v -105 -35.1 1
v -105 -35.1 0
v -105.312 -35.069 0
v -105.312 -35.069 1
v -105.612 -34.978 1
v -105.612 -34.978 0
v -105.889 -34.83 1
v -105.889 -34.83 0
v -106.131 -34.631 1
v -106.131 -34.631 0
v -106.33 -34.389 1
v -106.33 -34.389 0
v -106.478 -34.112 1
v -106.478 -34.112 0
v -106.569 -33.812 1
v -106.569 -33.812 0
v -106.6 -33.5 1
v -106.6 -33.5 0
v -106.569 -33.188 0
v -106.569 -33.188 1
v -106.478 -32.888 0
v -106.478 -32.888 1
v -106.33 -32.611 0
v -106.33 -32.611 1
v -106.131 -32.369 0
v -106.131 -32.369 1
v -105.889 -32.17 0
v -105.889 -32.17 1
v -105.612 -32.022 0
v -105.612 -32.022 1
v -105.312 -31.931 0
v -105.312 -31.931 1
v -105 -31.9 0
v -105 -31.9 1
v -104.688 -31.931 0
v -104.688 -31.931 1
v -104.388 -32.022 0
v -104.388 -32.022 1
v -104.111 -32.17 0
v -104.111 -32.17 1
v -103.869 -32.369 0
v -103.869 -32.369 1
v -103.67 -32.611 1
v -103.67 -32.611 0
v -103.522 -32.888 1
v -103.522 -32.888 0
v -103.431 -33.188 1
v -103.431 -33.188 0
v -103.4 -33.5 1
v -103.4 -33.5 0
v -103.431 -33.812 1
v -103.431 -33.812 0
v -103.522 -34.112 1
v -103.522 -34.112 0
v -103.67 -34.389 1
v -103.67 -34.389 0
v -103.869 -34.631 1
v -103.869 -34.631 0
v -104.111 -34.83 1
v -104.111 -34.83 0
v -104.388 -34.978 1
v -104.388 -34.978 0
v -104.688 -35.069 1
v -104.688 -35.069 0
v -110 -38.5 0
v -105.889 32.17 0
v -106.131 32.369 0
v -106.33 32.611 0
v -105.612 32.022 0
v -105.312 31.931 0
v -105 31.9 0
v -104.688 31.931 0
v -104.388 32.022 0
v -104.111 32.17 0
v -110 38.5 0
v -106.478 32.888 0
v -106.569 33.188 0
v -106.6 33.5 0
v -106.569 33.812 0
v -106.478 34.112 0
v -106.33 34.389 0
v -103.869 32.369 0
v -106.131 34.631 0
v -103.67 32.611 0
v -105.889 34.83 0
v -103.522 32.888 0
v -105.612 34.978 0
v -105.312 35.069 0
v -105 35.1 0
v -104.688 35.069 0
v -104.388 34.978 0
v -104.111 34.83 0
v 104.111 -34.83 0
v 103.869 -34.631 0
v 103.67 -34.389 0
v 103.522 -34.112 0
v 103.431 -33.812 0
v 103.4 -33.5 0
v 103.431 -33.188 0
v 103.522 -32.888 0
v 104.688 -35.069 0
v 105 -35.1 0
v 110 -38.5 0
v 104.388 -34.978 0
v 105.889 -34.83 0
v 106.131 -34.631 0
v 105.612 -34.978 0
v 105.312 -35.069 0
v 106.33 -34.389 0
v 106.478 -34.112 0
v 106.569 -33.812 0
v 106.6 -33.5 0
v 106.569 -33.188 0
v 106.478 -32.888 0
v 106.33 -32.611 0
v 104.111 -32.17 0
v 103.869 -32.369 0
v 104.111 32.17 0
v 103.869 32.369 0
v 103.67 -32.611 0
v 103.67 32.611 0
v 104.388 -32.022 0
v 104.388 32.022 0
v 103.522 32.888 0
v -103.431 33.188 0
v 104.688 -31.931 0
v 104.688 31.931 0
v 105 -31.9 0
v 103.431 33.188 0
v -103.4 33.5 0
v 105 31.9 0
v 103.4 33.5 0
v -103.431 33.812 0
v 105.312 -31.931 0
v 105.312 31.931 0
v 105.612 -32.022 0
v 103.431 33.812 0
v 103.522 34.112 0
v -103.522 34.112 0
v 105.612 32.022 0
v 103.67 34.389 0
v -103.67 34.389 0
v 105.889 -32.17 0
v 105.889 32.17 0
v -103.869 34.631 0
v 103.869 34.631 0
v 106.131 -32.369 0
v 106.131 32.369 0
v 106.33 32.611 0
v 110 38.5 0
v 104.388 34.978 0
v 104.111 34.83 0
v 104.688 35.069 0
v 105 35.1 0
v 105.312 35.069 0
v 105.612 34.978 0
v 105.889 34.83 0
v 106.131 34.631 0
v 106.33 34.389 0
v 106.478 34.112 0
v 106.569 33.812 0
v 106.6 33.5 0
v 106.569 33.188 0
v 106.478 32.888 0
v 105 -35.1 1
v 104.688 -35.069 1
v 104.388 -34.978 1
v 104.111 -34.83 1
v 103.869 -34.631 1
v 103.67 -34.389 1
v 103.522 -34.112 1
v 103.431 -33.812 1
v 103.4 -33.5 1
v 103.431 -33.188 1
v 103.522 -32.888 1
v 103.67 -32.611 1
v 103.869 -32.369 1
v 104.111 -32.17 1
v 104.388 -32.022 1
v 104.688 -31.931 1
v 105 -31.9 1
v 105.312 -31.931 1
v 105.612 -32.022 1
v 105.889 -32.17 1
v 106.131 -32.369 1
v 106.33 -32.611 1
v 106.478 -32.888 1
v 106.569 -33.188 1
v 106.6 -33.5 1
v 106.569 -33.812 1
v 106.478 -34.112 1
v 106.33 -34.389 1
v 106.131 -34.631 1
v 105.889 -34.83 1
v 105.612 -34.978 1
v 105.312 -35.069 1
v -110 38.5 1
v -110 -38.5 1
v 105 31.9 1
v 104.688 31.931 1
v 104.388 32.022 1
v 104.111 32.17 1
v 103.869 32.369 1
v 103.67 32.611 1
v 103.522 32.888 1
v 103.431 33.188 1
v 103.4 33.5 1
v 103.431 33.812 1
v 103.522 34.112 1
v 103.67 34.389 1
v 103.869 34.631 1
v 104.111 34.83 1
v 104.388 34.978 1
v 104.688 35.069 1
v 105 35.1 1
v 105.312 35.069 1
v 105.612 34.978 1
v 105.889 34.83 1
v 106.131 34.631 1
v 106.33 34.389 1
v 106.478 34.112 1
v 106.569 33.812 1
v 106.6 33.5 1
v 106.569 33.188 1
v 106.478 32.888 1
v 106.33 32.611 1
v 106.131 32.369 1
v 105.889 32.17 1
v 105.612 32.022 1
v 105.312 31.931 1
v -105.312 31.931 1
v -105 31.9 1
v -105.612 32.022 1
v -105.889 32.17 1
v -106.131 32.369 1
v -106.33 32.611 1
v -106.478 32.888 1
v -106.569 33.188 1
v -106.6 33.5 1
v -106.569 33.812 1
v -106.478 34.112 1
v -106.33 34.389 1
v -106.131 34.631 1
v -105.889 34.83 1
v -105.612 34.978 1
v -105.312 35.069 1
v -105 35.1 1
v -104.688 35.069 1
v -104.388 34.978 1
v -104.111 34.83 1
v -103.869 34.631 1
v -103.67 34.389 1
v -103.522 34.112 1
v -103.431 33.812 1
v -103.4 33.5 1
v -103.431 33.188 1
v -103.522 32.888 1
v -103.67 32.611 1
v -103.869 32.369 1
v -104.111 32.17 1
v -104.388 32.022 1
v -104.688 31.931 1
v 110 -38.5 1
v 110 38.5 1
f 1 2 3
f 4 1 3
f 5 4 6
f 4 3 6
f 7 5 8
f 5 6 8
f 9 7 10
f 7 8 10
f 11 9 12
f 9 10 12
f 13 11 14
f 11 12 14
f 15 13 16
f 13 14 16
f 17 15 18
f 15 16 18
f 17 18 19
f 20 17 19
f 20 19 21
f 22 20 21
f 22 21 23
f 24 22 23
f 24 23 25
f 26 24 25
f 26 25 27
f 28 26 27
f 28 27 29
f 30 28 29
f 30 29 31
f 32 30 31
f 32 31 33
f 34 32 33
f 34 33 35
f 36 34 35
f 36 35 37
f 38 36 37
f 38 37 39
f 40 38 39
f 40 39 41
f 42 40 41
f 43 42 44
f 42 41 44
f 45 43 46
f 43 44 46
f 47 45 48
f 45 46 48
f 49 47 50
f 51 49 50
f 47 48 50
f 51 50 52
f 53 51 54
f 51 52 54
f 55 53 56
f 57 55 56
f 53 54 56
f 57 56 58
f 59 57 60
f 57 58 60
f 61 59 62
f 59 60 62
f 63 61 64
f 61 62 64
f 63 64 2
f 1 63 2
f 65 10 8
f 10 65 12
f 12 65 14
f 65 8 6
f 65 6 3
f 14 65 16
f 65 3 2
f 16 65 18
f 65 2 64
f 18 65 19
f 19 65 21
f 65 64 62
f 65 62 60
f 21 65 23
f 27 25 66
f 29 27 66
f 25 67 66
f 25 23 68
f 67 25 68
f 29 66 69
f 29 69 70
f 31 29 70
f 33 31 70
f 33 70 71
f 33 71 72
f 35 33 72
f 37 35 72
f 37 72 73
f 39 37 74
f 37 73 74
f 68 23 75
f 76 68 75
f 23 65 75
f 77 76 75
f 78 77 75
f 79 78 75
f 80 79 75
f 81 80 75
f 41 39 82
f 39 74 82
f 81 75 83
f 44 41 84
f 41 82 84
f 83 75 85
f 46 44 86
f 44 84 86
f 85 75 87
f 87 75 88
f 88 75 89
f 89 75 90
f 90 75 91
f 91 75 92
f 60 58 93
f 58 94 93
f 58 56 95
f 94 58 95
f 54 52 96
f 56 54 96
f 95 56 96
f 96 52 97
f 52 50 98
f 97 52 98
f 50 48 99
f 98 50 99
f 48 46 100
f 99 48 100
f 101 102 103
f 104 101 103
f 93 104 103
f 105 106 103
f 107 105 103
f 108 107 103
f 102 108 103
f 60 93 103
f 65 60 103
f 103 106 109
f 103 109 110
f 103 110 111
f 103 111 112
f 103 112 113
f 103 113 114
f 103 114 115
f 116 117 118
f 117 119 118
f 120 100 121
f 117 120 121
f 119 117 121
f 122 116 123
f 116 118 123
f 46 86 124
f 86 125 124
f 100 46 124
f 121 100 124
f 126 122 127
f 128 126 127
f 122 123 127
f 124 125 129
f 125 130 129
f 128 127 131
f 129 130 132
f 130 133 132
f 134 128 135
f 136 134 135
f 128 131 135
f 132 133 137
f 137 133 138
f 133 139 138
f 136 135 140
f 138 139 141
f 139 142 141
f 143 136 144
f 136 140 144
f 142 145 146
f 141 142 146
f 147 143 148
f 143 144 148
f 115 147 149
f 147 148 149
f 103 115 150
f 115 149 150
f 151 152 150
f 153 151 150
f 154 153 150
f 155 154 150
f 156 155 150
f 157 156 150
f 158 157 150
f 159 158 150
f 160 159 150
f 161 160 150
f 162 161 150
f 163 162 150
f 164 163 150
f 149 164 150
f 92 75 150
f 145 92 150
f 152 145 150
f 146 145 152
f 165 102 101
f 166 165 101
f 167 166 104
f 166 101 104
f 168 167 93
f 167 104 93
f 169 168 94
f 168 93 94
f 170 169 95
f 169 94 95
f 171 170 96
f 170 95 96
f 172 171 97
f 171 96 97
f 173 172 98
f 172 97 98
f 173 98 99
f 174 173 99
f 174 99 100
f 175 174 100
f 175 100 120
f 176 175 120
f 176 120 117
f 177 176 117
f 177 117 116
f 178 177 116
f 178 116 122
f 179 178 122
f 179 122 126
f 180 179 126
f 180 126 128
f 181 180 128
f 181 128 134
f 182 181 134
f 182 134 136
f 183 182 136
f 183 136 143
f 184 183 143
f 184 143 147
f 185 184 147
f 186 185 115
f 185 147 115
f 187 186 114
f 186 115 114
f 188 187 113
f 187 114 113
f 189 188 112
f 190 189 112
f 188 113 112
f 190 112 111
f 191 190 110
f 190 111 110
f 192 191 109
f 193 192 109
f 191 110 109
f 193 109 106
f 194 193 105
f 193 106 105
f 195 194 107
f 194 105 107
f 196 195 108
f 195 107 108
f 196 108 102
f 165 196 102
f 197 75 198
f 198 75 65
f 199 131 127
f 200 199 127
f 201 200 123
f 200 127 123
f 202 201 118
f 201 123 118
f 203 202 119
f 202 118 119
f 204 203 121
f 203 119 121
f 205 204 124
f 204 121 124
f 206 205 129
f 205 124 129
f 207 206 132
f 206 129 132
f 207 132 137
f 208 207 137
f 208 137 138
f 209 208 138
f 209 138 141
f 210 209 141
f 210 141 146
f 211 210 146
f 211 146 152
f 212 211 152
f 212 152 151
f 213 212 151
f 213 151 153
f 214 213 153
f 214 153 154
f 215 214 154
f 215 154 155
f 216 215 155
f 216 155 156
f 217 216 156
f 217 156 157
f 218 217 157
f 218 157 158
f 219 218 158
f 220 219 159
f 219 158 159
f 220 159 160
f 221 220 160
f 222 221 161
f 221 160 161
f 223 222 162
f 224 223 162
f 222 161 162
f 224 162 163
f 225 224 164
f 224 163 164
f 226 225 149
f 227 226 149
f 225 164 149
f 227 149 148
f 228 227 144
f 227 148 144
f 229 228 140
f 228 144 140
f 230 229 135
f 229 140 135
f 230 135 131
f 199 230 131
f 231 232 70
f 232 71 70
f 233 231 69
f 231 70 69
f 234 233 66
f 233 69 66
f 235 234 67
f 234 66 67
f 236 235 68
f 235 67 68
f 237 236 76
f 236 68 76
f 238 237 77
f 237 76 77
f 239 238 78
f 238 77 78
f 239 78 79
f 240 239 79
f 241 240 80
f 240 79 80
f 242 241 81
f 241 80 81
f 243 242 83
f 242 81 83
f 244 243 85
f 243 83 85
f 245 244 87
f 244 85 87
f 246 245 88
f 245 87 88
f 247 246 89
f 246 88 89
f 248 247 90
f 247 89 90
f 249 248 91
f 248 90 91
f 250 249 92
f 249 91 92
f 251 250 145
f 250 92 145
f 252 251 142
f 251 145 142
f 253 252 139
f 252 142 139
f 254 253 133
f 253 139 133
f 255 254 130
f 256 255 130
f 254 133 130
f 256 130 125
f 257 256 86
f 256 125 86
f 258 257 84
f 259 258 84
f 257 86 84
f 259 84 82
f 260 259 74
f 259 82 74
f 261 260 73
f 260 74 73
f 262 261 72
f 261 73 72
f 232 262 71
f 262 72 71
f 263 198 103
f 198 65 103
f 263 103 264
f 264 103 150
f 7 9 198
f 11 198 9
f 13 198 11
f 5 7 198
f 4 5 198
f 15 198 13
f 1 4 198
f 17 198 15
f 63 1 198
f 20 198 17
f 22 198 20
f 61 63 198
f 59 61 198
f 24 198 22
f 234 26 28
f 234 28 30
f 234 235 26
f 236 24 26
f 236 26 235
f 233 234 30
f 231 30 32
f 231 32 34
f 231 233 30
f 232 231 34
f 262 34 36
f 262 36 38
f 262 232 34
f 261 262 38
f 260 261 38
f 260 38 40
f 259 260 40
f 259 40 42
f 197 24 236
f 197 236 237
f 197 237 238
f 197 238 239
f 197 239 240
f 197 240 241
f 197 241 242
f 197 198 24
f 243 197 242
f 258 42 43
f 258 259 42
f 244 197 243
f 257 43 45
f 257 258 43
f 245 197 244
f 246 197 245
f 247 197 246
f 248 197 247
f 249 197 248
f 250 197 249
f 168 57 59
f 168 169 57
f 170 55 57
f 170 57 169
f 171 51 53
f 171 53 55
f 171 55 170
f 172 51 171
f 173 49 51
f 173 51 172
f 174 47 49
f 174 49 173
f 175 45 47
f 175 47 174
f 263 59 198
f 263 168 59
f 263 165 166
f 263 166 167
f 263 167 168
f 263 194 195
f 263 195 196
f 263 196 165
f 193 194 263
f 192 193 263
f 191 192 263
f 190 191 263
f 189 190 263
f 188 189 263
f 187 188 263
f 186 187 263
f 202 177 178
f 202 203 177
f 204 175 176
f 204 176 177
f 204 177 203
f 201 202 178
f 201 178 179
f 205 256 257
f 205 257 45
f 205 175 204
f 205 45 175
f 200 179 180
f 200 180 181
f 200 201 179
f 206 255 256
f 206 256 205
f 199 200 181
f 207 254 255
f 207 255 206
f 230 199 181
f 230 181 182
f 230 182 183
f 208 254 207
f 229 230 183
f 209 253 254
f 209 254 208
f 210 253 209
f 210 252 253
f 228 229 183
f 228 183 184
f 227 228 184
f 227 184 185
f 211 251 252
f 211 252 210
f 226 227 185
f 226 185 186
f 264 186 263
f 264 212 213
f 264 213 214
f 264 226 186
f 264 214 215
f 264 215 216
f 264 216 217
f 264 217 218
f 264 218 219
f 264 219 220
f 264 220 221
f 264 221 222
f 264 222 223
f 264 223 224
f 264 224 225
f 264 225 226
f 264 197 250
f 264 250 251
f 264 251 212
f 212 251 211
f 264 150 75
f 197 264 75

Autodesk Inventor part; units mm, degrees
ref_plane "YZ Plane" through (0, 0, 0) normal (1, 0, 0) x (0, 1, 0)
ref_plane "XZ Plane" through (0, 0, 0) normal (0, 1, 0) x (-1, 0, 0)
ref_plane "XY Plane" through (0, 0, 0) normal (0, 0, 1) x (1, 0, 0)
sketch "スケッチ1" plane through (0, 0, 0) normal (0, 0, 1) x (1, 0, 0)
  line L0 (-110, -38.5) -> (110, -38.5)
  line L1 (110, -38.5) -> (110, 38.5)
  line L2 (110, 38.5) -> (-110, 38.5)
  line L3 (-110, 38.5) -> (-110, -38.5)
  line L4 (-110, -38.5) -> (110, 38.5) construction
  line L5 (110, -38.5) -> (-110, 38.5) construction
  point P0 (0, 0)
  dimension "d0" = 220
  dimension "d1" = 77
extrude "プレート1" add sketch "スケッチ1" along normal blind 1
sketch "スケッチ2" plane through (0, 0, 1) normal (0, 0, 1) x (1, 0, 0)
  line L0 (-110, -38.5) -> (-110, 38.5) projected
  line L1 (110, -38.5) -> (-110, -38.5) projected
  line L2 (110, 38.5) -> (110, -38.5) projected
  line L3 (-110, 38.5) -> (110, 38.5) projected
  line L4 (105, 33.5) -> (105, -33.5)
  line L5 (105, -33.5) -> (-105, -33.5)
  line L6 (-105, -33.5) -> (-105, 33.5)
  line L7 (-105, 33.5) -> (105, 33.5)
  point P0 (0, 0)
  dimension "d3" = 5
hole "穴1" at (-105, 33.5, 1) at (-105, -33.5, 1) at (105, -33.5, 1) at (105, 33.5, 1) direction (0, 0, -1) diameter 3.2 depth 1 clearance for "Flat Head Machine Screw" size "M3" standard "Ansi Metric M Profile"
equation "\"d9\" = Thickness"
equation "\"d2\" = Thickness"
equation "\"BendRadius\" = Thickness"
equation "\"BendReliefWidth\" = Thickness"
equation "\"BendReliefDepth\" = 0.5 * Thickness"
equation "\"CornerReliefSize\" = 4 * Thickness"
equation "\"MinimumRemnant\" = 2 * Thickness"
equation "\"TransitionRadius\" = BendRadius"
equation "\"JacobiRadiusSize\" = Thickness"
equation "\"GapSize\" = Thickness"
equation "\"Thickness\" = 1"
properties part number "carbon_plate14" material "CFRP"
